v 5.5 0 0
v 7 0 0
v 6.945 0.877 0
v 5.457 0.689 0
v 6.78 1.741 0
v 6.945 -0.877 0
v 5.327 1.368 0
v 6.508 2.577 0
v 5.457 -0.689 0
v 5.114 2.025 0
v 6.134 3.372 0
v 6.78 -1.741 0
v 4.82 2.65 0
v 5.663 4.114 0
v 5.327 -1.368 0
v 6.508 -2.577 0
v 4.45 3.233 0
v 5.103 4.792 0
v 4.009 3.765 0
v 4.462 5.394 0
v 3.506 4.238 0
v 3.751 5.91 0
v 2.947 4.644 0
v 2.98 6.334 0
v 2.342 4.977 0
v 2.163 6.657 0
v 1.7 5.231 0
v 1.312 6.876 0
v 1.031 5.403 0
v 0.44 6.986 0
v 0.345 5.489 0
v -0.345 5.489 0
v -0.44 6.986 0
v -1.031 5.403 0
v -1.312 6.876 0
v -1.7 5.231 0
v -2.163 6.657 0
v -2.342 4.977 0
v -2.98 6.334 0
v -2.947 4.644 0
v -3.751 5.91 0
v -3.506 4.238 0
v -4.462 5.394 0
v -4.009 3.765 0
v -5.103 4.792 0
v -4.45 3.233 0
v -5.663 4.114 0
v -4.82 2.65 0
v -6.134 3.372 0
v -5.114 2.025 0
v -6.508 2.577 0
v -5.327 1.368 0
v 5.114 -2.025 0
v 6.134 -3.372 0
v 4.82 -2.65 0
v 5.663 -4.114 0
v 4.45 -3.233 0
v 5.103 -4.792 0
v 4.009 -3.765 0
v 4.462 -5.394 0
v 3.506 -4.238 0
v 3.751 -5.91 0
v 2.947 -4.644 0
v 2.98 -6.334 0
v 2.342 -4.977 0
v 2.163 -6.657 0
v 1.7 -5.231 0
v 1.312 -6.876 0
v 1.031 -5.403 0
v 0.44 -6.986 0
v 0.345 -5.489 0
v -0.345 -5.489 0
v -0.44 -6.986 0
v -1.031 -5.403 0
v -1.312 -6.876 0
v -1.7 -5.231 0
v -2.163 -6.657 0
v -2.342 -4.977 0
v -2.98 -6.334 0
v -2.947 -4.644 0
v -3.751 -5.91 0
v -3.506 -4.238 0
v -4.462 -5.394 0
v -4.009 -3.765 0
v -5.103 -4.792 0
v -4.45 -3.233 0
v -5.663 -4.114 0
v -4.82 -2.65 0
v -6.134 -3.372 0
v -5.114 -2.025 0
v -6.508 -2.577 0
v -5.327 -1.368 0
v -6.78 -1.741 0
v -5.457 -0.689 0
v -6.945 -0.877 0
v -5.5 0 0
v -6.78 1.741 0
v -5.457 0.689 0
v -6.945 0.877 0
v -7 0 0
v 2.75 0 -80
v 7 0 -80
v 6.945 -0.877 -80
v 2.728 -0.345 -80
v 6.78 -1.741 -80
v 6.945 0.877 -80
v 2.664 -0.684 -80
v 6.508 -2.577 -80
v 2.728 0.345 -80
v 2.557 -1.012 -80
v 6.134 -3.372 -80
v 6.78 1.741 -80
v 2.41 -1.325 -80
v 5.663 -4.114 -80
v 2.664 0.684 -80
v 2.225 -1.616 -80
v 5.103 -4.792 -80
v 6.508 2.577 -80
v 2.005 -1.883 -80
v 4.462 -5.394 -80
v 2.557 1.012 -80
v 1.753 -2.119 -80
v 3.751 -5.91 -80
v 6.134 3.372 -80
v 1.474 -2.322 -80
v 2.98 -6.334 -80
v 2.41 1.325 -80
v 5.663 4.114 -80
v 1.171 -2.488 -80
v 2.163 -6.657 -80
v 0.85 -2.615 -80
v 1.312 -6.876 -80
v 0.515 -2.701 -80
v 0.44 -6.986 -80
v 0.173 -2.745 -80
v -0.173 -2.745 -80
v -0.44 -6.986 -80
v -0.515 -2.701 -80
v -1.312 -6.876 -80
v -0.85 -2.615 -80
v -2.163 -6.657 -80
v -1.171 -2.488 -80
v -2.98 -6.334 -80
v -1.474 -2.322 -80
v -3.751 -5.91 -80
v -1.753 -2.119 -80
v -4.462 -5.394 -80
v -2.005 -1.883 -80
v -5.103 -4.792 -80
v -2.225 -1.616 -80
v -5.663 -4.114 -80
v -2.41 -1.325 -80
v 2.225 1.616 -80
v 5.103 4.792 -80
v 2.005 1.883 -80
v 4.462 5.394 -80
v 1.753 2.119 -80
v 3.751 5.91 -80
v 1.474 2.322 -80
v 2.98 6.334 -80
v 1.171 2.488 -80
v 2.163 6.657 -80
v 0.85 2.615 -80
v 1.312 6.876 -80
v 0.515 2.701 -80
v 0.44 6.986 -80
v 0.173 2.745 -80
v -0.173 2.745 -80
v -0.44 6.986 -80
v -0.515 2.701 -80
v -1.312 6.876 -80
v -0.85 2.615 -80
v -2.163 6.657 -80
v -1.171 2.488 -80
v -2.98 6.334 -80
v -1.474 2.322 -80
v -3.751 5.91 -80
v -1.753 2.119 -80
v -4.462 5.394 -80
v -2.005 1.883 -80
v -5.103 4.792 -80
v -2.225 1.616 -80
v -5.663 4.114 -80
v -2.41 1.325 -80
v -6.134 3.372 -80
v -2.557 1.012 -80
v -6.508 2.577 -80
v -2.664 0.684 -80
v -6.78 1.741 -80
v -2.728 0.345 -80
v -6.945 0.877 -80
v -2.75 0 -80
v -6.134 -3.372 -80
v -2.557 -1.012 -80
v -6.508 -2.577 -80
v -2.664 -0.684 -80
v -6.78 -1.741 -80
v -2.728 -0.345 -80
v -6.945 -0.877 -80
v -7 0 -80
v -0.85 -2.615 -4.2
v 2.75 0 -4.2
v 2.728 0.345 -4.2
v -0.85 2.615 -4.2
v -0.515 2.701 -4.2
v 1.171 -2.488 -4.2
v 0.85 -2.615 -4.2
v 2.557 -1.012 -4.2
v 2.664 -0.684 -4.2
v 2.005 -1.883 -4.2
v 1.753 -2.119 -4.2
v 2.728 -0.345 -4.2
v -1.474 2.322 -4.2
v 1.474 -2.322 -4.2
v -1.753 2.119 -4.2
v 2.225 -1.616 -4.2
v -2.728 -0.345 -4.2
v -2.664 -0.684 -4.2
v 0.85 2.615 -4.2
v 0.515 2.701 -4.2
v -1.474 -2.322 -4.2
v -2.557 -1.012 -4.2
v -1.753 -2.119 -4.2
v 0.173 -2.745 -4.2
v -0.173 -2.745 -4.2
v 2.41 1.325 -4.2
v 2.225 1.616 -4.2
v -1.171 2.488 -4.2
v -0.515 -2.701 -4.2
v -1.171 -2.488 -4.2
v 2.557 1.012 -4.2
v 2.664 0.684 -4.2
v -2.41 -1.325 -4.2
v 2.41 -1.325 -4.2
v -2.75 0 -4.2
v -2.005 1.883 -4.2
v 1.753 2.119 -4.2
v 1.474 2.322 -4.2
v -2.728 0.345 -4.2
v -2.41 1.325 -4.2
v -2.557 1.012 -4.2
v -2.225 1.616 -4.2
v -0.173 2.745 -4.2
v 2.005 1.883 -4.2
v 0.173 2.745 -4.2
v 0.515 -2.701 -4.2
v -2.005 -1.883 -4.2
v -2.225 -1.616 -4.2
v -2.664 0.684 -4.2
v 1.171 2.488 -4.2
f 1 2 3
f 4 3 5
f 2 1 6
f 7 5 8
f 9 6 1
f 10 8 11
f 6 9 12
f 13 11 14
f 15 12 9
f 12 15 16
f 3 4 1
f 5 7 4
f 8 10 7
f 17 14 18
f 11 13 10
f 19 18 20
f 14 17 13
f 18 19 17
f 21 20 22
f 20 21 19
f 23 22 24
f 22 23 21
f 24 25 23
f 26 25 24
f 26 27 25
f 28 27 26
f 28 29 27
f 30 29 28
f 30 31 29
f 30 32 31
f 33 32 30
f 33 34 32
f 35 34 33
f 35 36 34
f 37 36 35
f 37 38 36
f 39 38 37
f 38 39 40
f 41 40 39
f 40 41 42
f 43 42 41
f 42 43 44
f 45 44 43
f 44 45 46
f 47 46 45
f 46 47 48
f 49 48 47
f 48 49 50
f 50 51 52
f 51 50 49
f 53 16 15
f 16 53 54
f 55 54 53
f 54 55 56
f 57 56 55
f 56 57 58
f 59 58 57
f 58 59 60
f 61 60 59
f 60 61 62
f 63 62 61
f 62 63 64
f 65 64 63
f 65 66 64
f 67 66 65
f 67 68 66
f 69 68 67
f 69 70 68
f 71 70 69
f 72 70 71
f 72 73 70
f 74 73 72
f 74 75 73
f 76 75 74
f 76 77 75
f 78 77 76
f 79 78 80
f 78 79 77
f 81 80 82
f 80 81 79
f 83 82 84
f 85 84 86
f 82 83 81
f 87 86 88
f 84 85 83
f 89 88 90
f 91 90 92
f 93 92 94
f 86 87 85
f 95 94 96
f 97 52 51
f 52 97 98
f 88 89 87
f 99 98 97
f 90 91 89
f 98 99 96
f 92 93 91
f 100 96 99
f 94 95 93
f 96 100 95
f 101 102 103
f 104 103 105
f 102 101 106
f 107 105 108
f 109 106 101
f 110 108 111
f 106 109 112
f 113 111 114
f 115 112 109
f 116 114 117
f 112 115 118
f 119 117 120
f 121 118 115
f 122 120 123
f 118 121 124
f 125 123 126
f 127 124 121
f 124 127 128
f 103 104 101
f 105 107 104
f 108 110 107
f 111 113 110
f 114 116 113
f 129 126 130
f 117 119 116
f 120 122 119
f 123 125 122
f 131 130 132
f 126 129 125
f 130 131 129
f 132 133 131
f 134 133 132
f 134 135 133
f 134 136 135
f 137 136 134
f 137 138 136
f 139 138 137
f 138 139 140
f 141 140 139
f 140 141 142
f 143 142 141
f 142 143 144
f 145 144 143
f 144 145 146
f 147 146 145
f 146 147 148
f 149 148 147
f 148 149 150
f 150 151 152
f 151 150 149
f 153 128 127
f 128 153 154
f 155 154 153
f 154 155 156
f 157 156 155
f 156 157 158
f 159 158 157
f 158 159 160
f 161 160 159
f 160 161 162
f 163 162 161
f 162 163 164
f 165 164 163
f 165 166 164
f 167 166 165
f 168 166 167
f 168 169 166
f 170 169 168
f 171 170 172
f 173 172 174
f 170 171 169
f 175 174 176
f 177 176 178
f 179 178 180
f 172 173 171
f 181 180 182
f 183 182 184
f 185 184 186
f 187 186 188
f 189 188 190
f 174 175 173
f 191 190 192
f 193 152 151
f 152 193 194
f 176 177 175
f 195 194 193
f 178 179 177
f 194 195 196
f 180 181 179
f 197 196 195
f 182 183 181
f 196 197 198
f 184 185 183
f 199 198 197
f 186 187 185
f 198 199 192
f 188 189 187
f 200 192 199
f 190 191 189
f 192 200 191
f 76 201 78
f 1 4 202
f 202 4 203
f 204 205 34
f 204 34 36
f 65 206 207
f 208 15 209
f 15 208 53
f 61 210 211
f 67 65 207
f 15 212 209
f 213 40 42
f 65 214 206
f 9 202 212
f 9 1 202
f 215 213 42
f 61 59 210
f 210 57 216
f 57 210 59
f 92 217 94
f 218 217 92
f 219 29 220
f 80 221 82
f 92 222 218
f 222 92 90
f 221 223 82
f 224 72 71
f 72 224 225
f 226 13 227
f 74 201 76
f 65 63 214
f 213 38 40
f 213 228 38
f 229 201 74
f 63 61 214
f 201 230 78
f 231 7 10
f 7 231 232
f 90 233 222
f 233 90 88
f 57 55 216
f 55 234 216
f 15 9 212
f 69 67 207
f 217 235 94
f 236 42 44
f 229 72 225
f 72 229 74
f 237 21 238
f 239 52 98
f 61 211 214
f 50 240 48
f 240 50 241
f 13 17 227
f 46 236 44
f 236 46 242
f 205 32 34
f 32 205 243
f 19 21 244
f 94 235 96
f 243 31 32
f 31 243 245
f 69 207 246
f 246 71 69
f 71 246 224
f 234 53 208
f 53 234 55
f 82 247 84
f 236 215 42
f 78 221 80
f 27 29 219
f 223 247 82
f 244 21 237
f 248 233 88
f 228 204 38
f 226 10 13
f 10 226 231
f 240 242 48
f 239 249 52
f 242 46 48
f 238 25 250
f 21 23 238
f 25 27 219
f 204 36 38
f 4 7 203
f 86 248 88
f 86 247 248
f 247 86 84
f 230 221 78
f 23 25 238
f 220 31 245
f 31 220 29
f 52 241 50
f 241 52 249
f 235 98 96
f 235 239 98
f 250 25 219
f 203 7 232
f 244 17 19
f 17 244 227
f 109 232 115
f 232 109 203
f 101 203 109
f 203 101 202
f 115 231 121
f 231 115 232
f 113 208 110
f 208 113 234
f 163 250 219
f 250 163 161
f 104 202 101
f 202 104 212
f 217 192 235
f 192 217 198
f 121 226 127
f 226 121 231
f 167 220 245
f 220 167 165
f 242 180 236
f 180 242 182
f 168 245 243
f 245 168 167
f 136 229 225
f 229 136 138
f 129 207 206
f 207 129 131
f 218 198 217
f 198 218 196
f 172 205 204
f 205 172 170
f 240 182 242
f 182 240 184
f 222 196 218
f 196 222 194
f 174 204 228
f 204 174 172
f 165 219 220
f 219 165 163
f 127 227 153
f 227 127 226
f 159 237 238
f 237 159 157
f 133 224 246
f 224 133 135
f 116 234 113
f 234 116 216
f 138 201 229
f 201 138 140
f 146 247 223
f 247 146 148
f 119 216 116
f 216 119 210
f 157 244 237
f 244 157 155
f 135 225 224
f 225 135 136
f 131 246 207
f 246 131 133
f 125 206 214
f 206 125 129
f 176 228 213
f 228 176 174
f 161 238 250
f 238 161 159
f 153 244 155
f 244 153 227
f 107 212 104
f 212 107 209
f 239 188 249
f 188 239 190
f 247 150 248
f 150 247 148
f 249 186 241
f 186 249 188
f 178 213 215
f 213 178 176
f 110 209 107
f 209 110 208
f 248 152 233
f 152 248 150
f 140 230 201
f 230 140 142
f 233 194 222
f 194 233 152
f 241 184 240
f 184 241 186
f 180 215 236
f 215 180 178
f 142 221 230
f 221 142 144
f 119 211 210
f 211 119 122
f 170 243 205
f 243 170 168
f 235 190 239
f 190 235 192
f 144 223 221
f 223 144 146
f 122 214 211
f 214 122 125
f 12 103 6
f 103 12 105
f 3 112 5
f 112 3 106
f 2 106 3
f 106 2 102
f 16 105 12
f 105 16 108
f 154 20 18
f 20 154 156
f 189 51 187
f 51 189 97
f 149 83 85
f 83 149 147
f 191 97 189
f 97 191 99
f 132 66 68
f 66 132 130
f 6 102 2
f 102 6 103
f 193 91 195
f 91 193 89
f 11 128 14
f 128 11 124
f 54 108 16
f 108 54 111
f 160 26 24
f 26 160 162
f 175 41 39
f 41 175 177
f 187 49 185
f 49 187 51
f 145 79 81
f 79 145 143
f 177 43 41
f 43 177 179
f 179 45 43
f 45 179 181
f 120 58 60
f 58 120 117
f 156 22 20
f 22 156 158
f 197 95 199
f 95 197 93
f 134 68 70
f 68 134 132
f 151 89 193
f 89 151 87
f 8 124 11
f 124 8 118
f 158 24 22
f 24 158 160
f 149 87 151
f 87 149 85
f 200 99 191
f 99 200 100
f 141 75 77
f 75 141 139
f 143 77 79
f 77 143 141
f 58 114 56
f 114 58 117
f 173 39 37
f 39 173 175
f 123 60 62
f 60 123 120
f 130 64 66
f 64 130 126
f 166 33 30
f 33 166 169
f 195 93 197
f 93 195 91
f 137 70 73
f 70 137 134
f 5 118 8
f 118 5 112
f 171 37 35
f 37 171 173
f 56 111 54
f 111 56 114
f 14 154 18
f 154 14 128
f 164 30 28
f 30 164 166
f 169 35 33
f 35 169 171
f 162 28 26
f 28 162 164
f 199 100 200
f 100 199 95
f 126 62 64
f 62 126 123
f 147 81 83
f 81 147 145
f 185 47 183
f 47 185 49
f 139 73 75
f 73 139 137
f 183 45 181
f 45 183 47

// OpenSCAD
$fn = 50;


difference() {
	union() {
		translate(v = [0, 0, -80.0000000000]) {
			cylinder(h = 80, r = 7.0000000000);
		}
		cylinder(h = 0, r = 10.0000000000);
	}
	union() {
		translate(v = [0, 0, 0]) {
			rotate(a = [0, 0, 0]) {
				difference() {
					union() {
						#translate(v = [0, 0, -80.0000000000]) {
							cylinder(h = 80, r = 2.2500000000);
						}
						#translate(v = [0, 0, -4.2000000000]) {
							cylinder(h = 4.2000000000, r1 = 2.7500000000, r2 = 5.5000000000);
						}
						#translate(v = [0, 0, -80.0000000000]) {
							cylinder(h = 80, r = 2.7500000000);
						}
						#translate(v = [0, 0, -80.0000000000]) {
							cylinder(h = 80, r = 2.2500000000);
						}
					}
					union();
				}
			}
		}
	}
}
